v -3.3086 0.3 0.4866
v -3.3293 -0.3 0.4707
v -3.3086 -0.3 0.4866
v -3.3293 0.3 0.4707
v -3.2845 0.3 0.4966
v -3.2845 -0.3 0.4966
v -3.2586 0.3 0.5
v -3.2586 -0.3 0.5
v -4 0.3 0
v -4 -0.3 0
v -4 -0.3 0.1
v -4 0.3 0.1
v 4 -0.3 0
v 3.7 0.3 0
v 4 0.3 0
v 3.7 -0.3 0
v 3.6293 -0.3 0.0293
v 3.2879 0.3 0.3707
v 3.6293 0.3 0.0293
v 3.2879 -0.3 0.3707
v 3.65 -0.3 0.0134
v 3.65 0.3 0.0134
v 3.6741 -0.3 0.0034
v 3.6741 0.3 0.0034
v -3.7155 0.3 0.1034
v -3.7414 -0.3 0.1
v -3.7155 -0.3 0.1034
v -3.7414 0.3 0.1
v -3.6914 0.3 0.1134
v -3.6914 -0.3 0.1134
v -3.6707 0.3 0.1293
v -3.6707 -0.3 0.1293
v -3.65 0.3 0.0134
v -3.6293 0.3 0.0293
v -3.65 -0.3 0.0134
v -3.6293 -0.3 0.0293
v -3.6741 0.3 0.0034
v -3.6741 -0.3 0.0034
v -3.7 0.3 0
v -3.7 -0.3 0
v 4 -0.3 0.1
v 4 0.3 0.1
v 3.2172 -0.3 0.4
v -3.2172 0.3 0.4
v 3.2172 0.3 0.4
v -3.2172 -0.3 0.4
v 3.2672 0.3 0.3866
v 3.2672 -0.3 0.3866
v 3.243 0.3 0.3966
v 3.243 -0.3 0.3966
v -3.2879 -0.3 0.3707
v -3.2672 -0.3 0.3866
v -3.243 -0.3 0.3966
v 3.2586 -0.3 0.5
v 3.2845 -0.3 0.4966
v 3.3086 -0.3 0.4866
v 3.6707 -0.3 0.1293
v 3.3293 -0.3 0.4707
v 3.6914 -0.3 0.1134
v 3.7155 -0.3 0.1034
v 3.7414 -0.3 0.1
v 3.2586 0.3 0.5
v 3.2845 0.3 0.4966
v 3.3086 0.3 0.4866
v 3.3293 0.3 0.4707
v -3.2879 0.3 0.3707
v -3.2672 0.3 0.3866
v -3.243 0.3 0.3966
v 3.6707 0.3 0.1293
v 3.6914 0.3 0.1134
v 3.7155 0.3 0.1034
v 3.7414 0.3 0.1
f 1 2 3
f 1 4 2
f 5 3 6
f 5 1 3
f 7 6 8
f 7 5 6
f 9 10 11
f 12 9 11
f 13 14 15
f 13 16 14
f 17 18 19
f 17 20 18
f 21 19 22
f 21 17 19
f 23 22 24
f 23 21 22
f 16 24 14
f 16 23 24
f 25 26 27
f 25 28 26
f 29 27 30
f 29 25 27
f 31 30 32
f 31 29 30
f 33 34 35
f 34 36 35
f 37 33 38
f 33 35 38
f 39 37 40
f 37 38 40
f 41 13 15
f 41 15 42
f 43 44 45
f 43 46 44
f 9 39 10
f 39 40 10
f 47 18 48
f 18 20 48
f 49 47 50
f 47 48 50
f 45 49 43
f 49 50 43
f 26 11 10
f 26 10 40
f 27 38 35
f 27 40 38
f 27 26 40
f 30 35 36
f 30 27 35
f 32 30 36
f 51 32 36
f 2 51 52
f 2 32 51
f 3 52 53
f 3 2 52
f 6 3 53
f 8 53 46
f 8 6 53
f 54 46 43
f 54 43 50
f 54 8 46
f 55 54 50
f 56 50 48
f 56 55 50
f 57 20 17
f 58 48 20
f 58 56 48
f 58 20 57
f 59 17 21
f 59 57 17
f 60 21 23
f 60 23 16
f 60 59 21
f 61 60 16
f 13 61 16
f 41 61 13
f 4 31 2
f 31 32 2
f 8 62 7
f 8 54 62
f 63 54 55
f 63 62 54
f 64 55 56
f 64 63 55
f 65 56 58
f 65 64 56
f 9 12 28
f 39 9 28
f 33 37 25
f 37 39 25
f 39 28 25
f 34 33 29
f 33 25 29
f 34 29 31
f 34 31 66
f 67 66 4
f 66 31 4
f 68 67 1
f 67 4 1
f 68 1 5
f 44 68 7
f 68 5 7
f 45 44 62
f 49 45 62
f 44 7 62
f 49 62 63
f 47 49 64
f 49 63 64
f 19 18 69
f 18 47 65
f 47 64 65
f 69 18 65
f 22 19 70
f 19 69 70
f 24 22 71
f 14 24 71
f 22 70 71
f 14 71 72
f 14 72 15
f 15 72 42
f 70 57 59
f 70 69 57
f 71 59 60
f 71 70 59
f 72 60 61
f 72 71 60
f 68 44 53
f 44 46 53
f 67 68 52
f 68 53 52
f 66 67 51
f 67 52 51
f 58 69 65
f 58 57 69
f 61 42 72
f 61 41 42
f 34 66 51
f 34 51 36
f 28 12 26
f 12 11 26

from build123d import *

# Parameters (mm, degrees)
PAD006_DEPTH = 0.3
FILLET005_R  = 0.1


with BuildPart() as part:
    # Sketch007 → Pad006 (new body, symmetric)
    with BuildSketch(Plane.XZ):
        Polygon((-4, 0), (-4, 0.1), (-3.7, 0.1), (-3.3, 0.5), (0, 0.5), (0, 0.4), (-3.258579, 0.4), (-3.658579, 0), align=None)
    pad006 = extrude(amount=PAD006_DEPTH, both=True)

    # Mirrored: Pad006 across Sketch007 V_Axis
    add(pad006.mirror(Plane(origin=(0, 0, 0), x_dir=(0, -1, 0), z_dir=(1, 0, 0))))

    # Fillet005
    fillet005_edges = [part.edges().sort_by_distance(p)[0] for p in [
        (-3.7, 0, 0.1),
        (-3.3, 0, 0.5),
        (-3.658579, 0, 0),
        (-3.258579, 0, 0.4),
        (3.258579, 0, 0.4),
        (3.658579, 0, 0),
        (3.3, 0, 0.5),
        (3.7, 0, 0.1),
    ]]
    fillet(fillet005_edges, radius=FILLET005_R)


solid = part.part
